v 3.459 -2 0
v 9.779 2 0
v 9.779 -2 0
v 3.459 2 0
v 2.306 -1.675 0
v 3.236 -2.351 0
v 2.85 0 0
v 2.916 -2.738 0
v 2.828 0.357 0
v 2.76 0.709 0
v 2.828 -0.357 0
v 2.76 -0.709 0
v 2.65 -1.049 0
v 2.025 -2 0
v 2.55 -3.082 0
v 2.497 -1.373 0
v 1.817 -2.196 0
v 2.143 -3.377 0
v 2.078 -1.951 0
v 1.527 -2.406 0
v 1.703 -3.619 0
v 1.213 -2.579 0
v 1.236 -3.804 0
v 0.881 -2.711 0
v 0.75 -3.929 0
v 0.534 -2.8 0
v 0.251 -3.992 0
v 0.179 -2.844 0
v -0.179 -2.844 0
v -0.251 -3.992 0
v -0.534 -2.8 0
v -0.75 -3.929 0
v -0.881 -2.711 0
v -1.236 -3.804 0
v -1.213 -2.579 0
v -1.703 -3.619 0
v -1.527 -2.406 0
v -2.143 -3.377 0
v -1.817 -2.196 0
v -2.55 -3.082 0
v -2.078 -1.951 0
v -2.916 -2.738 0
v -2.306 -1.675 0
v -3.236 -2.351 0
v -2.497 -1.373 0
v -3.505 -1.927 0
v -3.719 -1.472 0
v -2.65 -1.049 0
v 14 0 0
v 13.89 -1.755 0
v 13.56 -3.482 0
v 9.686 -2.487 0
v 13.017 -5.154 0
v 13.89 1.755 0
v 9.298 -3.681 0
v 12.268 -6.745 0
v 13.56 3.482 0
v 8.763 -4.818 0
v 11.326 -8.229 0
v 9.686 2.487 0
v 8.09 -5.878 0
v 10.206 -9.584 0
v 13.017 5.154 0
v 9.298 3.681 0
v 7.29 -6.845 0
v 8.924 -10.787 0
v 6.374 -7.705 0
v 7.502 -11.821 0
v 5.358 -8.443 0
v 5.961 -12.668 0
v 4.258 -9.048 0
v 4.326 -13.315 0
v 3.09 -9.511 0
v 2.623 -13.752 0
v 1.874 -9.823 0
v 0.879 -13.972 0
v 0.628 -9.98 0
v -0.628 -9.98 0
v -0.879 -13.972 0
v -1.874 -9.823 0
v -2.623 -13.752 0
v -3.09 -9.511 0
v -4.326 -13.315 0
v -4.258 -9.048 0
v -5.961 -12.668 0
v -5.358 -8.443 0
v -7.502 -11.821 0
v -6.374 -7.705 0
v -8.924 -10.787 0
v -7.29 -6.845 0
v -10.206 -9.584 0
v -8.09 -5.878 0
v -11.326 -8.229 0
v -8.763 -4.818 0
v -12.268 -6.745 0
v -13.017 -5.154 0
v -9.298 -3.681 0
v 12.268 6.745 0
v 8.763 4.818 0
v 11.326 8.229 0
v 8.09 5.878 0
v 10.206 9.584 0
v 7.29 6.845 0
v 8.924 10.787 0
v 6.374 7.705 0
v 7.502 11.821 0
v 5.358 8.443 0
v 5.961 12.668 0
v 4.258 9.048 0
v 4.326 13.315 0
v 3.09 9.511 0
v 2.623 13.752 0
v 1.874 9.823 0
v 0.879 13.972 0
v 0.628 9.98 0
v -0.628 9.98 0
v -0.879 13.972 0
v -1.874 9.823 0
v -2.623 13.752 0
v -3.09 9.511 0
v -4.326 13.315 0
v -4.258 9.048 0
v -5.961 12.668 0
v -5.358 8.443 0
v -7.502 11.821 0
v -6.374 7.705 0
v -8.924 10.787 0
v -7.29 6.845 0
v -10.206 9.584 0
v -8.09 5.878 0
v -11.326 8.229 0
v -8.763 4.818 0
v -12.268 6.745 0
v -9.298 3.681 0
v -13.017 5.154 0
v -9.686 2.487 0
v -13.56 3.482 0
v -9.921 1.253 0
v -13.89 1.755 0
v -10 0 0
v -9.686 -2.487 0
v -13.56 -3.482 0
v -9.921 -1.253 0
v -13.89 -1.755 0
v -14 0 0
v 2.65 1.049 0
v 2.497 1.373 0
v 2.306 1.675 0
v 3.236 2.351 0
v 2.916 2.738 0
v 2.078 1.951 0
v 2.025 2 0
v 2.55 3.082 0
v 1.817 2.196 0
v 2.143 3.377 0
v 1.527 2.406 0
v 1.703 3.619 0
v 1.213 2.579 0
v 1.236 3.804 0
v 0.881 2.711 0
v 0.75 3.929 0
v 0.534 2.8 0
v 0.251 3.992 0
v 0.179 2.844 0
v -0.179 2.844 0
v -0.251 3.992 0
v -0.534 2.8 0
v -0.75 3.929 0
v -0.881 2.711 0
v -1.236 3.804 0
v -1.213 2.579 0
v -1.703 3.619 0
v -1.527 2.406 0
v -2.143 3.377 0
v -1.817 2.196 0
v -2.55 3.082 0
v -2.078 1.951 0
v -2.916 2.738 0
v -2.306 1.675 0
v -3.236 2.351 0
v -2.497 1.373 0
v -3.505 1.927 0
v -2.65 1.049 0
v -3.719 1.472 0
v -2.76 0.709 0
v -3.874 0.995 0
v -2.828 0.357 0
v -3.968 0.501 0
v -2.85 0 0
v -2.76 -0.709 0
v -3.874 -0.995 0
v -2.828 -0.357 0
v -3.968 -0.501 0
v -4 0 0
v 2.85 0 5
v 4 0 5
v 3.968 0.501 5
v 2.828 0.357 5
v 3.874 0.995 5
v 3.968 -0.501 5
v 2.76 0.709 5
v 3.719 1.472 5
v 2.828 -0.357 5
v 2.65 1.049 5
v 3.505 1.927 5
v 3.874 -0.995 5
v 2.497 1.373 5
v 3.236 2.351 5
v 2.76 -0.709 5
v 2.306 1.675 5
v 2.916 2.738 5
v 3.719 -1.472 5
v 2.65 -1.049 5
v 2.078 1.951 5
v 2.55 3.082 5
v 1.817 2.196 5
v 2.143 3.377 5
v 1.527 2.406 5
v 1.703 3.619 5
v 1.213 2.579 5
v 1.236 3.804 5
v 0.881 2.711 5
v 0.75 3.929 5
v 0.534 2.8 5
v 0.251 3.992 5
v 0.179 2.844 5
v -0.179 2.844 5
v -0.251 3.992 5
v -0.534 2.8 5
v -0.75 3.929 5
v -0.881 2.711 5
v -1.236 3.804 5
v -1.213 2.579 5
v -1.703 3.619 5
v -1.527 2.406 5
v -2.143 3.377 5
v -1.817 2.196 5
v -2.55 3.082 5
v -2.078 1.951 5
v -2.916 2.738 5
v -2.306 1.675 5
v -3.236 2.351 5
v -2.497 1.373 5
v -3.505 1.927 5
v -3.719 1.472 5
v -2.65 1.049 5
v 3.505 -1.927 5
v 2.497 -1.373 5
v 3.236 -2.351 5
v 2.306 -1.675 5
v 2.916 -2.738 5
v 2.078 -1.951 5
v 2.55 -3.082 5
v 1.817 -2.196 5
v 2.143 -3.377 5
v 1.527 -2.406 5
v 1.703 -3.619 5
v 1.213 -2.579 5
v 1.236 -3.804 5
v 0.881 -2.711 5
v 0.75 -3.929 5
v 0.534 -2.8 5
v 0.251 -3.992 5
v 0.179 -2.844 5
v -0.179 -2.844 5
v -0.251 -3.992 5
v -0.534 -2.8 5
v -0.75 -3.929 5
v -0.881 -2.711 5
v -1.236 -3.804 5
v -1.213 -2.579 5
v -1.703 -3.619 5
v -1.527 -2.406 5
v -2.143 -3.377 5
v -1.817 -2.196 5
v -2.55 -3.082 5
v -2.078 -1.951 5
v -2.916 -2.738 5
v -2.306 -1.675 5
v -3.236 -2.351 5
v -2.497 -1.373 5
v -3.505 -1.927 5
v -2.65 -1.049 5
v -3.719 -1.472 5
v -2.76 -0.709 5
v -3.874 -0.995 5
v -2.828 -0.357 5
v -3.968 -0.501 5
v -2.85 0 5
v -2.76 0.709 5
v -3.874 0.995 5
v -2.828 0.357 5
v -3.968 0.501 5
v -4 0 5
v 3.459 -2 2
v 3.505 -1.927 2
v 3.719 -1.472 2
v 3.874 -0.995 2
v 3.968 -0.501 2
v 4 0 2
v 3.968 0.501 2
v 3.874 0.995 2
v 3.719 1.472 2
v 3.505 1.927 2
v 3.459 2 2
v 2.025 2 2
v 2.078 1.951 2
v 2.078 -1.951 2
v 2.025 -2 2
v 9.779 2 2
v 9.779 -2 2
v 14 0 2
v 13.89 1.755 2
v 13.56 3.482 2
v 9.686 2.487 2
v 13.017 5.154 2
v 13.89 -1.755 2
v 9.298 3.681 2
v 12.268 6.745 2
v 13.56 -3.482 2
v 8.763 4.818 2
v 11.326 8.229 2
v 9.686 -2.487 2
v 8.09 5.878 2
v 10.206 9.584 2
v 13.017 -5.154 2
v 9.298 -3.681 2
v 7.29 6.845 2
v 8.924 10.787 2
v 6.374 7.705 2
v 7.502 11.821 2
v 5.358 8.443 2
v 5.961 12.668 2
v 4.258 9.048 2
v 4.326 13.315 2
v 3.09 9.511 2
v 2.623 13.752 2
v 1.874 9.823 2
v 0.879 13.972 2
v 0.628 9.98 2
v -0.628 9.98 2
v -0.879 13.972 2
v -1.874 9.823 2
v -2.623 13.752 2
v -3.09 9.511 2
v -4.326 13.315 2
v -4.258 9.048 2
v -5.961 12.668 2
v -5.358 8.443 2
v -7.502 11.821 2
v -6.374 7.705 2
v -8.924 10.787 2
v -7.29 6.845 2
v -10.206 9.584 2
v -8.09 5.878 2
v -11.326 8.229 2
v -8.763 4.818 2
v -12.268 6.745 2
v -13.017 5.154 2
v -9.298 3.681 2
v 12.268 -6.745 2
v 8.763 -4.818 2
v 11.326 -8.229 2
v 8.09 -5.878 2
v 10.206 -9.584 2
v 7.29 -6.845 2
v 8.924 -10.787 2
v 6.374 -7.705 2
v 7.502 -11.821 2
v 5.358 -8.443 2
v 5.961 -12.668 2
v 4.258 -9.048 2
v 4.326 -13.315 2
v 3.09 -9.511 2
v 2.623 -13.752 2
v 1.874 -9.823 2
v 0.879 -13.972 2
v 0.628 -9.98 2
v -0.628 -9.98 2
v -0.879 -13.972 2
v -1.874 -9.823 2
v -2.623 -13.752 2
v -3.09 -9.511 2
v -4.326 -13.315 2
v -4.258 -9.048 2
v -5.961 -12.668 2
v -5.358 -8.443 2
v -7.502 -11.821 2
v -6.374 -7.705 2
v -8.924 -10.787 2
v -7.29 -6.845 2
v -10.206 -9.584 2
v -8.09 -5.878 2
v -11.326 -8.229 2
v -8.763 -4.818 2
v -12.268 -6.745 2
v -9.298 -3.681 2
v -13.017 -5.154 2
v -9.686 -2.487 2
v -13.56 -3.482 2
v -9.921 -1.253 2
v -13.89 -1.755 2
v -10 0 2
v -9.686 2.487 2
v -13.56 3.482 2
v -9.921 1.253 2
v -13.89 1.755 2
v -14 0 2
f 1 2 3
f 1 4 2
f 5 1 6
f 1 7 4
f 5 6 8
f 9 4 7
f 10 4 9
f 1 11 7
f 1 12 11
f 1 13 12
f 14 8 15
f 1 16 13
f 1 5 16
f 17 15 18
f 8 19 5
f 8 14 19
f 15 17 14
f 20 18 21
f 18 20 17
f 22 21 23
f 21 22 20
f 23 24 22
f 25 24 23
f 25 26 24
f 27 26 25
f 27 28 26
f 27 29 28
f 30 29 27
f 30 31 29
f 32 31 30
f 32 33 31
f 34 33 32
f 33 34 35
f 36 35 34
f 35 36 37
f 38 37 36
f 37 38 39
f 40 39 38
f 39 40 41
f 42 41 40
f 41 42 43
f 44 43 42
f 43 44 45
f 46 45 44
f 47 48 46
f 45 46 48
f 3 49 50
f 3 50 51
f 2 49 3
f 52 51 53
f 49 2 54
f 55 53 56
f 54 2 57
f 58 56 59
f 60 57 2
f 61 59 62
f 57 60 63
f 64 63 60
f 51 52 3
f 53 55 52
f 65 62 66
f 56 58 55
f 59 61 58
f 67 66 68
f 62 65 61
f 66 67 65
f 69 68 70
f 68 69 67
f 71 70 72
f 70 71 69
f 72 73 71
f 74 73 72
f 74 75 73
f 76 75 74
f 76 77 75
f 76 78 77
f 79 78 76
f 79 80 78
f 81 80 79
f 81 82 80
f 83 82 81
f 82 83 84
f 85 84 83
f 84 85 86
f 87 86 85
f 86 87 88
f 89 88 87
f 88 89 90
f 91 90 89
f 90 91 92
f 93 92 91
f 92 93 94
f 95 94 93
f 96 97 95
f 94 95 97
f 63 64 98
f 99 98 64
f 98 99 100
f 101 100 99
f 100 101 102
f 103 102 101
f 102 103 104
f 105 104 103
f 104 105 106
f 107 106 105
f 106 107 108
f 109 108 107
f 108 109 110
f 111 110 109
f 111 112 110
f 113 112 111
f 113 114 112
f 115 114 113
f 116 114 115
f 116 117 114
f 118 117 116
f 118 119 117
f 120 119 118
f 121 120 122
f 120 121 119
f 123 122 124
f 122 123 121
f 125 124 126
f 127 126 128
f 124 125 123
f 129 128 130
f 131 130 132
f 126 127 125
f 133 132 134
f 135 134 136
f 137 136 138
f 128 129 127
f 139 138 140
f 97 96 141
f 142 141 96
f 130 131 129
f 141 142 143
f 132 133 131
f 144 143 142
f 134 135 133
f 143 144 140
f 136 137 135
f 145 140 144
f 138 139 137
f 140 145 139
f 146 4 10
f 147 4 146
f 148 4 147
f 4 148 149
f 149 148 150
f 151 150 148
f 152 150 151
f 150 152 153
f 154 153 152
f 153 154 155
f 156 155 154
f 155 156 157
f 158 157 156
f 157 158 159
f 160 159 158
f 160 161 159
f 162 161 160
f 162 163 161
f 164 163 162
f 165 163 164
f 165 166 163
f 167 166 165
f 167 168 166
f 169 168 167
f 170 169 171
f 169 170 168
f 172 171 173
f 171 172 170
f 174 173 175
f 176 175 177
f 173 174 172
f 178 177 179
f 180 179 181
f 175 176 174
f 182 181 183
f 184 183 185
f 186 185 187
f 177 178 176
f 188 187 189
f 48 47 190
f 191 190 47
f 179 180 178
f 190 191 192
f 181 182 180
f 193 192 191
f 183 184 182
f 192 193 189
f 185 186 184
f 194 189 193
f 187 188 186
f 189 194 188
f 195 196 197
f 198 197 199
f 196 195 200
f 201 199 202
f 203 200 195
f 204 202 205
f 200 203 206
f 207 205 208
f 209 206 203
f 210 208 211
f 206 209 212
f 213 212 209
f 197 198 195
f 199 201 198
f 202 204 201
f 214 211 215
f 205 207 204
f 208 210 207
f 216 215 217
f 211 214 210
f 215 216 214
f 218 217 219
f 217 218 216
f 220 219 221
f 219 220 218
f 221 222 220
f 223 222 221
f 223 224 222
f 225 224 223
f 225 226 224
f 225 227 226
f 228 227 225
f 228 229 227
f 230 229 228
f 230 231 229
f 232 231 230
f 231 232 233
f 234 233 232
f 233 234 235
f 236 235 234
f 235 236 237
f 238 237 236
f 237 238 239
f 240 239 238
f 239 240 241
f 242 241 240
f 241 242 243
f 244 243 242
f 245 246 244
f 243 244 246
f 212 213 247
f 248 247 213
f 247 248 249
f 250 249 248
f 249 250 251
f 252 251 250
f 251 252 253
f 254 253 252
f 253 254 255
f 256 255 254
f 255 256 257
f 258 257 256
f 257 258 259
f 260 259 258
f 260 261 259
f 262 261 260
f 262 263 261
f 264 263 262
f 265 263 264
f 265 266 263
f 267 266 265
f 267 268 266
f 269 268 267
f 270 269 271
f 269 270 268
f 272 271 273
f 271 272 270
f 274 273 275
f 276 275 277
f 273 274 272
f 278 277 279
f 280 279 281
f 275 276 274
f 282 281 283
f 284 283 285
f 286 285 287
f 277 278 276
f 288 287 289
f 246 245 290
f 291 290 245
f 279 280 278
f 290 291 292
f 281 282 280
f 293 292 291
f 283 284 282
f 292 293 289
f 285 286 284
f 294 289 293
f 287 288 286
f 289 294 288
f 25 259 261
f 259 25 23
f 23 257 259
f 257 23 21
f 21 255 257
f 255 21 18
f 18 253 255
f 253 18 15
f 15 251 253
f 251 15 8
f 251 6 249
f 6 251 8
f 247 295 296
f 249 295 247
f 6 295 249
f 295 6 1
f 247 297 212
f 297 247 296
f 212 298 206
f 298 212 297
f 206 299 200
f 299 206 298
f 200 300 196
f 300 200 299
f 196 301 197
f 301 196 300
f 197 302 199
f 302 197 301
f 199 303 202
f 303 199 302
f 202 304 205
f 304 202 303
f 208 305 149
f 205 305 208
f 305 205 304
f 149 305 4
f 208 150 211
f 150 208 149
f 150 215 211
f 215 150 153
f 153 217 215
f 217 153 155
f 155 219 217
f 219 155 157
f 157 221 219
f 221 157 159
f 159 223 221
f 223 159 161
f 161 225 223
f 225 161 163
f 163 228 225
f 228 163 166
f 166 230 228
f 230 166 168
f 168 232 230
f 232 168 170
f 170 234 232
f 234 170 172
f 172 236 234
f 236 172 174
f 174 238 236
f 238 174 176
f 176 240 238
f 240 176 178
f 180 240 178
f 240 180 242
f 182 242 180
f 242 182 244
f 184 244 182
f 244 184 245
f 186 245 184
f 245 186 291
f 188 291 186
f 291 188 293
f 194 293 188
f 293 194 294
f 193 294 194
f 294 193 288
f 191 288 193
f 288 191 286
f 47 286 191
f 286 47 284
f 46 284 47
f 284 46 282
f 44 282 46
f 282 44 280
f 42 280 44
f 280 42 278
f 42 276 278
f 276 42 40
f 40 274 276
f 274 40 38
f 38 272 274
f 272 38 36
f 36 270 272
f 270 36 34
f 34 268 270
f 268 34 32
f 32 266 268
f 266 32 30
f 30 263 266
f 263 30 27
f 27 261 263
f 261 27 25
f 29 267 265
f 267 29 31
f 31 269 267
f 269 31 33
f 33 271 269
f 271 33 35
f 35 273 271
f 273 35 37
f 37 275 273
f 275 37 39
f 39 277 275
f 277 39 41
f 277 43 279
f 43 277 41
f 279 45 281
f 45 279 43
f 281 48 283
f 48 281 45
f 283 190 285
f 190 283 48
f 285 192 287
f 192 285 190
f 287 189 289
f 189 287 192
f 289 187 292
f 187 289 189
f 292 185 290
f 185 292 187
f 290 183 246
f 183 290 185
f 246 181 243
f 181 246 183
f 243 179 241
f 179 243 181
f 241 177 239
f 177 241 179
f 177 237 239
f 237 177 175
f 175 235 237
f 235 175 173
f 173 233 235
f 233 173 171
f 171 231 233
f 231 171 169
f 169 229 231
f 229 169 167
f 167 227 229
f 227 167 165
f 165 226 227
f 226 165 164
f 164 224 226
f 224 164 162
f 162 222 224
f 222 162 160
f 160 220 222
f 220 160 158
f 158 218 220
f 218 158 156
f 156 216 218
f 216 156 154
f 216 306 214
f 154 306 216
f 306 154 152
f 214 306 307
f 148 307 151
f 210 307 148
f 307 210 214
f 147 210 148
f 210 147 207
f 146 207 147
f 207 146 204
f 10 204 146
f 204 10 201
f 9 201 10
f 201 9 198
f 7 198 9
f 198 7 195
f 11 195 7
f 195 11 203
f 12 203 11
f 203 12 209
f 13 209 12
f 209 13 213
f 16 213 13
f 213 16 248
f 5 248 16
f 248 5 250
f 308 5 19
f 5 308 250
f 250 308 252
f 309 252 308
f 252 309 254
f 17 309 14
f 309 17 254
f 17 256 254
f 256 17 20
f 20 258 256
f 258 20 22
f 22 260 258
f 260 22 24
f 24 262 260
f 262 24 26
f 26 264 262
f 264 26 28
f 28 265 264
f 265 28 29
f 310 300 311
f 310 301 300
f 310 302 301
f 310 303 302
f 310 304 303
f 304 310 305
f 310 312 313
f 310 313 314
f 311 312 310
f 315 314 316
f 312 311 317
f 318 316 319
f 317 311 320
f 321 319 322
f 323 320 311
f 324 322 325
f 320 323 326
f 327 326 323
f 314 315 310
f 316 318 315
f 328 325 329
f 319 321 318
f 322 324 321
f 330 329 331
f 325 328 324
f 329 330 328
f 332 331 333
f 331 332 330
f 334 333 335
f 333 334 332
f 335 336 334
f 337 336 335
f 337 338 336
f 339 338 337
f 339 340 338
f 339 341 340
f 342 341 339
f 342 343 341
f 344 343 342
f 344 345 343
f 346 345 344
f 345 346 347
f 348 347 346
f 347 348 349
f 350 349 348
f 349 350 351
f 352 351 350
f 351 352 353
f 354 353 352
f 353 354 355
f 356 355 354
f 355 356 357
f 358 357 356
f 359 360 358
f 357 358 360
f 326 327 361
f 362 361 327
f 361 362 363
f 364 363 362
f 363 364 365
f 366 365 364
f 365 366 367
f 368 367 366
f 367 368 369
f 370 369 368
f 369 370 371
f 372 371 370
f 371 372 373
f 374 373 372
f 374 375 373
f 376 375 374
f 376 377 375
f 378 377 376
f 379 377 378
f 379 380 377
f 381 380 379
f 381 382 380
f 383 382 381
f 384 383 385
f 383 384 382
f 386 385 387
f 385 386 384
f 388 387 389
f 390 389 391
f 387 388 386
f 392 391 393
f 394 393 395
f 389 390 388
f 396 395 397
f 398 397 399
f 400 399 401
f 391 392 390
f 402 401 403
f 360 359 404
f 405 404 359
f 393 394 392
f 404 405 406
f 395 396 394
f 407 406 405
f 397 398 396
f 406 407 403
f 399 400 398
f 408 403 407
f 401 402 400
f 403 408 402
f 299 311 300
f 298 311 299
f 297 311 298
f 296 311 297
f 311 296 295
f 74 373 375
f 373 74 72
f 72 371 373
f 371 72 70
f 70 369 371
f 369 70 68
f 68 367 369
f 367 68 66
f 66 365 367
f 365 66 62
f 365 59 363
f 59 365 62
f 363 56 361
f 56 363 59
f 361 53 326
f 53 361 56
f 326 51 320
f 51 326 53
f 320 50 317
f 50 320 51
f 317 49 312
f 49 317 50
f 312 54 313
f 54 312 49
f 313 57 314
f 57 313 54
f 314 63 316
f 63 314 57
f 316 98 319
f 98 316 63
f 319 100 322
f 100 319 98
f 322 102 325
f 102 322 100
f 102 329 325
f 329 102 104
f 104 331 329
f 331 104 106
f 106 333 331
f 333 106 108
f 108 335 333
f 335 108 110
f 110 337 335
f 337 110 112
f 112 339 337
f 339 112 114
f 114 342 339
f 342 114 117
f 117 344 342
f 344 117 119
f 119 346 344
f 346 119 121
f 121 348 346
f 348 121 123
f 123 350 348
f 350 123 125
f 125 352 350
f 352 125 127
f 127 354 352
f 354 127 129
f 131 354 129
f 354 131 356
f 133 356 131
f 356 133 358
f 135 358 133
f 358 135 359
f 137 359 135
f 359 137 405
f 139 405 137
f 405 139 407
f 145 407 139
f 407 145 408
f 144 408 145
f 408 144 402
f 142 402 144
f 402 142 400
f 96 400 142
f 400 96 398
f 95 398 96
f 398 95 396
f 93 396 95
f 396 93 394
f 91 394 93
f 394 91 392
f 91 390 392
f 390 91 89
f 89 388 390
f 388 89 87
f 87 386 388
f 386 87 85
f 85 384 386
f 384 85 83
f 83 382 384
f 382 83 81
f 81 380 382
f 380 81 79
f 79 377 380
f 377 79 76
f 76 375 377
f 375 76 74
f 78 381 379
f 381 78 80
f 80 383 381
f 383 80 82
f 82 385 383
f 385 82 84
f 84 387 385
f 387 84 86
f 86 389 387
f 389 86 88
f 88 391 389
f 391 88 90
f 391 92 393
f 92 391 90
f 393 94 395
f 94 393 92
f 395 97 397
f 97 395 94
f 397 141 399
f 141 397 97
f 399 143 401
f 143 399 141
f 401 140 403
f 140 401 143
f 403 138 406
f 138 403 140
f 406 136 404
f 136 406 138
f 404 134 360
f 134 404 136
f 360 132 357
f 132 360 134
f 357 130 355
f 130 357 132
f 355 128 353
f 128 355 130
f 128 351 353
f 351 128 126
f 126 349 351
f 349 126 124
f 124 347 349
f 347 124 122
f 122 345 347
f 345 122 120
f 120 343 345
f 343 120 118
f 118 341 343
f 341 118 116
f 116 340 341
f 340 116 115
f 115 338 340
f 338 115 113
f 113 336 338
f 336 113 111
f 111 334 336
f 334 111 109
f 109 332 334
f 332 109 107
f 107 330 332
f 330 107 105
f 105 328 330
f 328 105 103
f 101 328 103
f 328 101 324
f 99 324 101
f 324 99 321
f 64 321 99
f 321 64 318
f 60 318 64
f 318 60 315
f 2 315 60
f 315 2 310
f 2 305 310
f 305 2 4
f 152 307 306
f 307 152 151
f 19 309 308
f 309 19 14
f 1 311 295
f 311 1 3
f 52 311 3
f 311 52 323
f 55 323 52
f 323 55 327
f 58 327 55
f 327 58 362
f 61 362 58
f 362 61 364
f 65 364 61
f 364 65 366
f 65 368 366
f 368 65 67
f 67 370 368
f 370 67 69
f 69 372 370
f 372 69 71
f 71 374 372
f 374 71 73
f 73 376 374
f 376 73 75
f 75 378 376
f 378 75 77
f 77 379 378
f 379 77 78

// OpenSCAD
// Suporte Motorzinho
//
// (c) 2014 Afonso Coutinho <afonso@yack.com.br>
// (c) 2014 Felipe Sanches <juca@members.fsf.org>
//
// This program is free software: you can redistribute it and/or modify
// it under the terms of the GNU General Public License as published by
// the Free Software Foundation, either version 2 of the License, or
// (at your option) any later version.
//
// This program is distributed in the hope that it will be useful,
// but WITHOUT ANY WARRANTY; without even the implied warranty of
// MERCHANTABILITY or FITNESS FOR A PARTICULAR PURPOSE.  See the
// GNU General Public License for more details.
//
// You should have received a copy of the GNU General Public License
// along with this program.  If not, see <http://www.gnu.org/licenses/>.

$fn = 50;

//R_in:  raio interno do disco
//R_out: raio externo do disco
//h:     espessura do disco
//r_in:  raio interno do tubo central
//r_out: raio externo do tubo central
//H:     altura do tubo central
//L:     largura da conexão entre o tubo e o disco
module Suporte_Motorzinho(R_in=10, R_out=14, r_in=2.85, r_out=4, H=5, h=2, L=4){
	linear_extrude(height = H){
		//tubo:
		difference(){
			circle(r = r_out);
			circle(r = r_in);
		}
	}

	linear_extrude(height = h){
		//conexão entre o tubo e o disco:
		difference(){
			translate([0, -L/2]) square([R_in, L]);
			circle(r = r_in);
		}
		//disco:
		difference(){
			circle(r = R_out);
			circle(r = R_in);
		}
	}
}

Suporte_Motorzinho();
